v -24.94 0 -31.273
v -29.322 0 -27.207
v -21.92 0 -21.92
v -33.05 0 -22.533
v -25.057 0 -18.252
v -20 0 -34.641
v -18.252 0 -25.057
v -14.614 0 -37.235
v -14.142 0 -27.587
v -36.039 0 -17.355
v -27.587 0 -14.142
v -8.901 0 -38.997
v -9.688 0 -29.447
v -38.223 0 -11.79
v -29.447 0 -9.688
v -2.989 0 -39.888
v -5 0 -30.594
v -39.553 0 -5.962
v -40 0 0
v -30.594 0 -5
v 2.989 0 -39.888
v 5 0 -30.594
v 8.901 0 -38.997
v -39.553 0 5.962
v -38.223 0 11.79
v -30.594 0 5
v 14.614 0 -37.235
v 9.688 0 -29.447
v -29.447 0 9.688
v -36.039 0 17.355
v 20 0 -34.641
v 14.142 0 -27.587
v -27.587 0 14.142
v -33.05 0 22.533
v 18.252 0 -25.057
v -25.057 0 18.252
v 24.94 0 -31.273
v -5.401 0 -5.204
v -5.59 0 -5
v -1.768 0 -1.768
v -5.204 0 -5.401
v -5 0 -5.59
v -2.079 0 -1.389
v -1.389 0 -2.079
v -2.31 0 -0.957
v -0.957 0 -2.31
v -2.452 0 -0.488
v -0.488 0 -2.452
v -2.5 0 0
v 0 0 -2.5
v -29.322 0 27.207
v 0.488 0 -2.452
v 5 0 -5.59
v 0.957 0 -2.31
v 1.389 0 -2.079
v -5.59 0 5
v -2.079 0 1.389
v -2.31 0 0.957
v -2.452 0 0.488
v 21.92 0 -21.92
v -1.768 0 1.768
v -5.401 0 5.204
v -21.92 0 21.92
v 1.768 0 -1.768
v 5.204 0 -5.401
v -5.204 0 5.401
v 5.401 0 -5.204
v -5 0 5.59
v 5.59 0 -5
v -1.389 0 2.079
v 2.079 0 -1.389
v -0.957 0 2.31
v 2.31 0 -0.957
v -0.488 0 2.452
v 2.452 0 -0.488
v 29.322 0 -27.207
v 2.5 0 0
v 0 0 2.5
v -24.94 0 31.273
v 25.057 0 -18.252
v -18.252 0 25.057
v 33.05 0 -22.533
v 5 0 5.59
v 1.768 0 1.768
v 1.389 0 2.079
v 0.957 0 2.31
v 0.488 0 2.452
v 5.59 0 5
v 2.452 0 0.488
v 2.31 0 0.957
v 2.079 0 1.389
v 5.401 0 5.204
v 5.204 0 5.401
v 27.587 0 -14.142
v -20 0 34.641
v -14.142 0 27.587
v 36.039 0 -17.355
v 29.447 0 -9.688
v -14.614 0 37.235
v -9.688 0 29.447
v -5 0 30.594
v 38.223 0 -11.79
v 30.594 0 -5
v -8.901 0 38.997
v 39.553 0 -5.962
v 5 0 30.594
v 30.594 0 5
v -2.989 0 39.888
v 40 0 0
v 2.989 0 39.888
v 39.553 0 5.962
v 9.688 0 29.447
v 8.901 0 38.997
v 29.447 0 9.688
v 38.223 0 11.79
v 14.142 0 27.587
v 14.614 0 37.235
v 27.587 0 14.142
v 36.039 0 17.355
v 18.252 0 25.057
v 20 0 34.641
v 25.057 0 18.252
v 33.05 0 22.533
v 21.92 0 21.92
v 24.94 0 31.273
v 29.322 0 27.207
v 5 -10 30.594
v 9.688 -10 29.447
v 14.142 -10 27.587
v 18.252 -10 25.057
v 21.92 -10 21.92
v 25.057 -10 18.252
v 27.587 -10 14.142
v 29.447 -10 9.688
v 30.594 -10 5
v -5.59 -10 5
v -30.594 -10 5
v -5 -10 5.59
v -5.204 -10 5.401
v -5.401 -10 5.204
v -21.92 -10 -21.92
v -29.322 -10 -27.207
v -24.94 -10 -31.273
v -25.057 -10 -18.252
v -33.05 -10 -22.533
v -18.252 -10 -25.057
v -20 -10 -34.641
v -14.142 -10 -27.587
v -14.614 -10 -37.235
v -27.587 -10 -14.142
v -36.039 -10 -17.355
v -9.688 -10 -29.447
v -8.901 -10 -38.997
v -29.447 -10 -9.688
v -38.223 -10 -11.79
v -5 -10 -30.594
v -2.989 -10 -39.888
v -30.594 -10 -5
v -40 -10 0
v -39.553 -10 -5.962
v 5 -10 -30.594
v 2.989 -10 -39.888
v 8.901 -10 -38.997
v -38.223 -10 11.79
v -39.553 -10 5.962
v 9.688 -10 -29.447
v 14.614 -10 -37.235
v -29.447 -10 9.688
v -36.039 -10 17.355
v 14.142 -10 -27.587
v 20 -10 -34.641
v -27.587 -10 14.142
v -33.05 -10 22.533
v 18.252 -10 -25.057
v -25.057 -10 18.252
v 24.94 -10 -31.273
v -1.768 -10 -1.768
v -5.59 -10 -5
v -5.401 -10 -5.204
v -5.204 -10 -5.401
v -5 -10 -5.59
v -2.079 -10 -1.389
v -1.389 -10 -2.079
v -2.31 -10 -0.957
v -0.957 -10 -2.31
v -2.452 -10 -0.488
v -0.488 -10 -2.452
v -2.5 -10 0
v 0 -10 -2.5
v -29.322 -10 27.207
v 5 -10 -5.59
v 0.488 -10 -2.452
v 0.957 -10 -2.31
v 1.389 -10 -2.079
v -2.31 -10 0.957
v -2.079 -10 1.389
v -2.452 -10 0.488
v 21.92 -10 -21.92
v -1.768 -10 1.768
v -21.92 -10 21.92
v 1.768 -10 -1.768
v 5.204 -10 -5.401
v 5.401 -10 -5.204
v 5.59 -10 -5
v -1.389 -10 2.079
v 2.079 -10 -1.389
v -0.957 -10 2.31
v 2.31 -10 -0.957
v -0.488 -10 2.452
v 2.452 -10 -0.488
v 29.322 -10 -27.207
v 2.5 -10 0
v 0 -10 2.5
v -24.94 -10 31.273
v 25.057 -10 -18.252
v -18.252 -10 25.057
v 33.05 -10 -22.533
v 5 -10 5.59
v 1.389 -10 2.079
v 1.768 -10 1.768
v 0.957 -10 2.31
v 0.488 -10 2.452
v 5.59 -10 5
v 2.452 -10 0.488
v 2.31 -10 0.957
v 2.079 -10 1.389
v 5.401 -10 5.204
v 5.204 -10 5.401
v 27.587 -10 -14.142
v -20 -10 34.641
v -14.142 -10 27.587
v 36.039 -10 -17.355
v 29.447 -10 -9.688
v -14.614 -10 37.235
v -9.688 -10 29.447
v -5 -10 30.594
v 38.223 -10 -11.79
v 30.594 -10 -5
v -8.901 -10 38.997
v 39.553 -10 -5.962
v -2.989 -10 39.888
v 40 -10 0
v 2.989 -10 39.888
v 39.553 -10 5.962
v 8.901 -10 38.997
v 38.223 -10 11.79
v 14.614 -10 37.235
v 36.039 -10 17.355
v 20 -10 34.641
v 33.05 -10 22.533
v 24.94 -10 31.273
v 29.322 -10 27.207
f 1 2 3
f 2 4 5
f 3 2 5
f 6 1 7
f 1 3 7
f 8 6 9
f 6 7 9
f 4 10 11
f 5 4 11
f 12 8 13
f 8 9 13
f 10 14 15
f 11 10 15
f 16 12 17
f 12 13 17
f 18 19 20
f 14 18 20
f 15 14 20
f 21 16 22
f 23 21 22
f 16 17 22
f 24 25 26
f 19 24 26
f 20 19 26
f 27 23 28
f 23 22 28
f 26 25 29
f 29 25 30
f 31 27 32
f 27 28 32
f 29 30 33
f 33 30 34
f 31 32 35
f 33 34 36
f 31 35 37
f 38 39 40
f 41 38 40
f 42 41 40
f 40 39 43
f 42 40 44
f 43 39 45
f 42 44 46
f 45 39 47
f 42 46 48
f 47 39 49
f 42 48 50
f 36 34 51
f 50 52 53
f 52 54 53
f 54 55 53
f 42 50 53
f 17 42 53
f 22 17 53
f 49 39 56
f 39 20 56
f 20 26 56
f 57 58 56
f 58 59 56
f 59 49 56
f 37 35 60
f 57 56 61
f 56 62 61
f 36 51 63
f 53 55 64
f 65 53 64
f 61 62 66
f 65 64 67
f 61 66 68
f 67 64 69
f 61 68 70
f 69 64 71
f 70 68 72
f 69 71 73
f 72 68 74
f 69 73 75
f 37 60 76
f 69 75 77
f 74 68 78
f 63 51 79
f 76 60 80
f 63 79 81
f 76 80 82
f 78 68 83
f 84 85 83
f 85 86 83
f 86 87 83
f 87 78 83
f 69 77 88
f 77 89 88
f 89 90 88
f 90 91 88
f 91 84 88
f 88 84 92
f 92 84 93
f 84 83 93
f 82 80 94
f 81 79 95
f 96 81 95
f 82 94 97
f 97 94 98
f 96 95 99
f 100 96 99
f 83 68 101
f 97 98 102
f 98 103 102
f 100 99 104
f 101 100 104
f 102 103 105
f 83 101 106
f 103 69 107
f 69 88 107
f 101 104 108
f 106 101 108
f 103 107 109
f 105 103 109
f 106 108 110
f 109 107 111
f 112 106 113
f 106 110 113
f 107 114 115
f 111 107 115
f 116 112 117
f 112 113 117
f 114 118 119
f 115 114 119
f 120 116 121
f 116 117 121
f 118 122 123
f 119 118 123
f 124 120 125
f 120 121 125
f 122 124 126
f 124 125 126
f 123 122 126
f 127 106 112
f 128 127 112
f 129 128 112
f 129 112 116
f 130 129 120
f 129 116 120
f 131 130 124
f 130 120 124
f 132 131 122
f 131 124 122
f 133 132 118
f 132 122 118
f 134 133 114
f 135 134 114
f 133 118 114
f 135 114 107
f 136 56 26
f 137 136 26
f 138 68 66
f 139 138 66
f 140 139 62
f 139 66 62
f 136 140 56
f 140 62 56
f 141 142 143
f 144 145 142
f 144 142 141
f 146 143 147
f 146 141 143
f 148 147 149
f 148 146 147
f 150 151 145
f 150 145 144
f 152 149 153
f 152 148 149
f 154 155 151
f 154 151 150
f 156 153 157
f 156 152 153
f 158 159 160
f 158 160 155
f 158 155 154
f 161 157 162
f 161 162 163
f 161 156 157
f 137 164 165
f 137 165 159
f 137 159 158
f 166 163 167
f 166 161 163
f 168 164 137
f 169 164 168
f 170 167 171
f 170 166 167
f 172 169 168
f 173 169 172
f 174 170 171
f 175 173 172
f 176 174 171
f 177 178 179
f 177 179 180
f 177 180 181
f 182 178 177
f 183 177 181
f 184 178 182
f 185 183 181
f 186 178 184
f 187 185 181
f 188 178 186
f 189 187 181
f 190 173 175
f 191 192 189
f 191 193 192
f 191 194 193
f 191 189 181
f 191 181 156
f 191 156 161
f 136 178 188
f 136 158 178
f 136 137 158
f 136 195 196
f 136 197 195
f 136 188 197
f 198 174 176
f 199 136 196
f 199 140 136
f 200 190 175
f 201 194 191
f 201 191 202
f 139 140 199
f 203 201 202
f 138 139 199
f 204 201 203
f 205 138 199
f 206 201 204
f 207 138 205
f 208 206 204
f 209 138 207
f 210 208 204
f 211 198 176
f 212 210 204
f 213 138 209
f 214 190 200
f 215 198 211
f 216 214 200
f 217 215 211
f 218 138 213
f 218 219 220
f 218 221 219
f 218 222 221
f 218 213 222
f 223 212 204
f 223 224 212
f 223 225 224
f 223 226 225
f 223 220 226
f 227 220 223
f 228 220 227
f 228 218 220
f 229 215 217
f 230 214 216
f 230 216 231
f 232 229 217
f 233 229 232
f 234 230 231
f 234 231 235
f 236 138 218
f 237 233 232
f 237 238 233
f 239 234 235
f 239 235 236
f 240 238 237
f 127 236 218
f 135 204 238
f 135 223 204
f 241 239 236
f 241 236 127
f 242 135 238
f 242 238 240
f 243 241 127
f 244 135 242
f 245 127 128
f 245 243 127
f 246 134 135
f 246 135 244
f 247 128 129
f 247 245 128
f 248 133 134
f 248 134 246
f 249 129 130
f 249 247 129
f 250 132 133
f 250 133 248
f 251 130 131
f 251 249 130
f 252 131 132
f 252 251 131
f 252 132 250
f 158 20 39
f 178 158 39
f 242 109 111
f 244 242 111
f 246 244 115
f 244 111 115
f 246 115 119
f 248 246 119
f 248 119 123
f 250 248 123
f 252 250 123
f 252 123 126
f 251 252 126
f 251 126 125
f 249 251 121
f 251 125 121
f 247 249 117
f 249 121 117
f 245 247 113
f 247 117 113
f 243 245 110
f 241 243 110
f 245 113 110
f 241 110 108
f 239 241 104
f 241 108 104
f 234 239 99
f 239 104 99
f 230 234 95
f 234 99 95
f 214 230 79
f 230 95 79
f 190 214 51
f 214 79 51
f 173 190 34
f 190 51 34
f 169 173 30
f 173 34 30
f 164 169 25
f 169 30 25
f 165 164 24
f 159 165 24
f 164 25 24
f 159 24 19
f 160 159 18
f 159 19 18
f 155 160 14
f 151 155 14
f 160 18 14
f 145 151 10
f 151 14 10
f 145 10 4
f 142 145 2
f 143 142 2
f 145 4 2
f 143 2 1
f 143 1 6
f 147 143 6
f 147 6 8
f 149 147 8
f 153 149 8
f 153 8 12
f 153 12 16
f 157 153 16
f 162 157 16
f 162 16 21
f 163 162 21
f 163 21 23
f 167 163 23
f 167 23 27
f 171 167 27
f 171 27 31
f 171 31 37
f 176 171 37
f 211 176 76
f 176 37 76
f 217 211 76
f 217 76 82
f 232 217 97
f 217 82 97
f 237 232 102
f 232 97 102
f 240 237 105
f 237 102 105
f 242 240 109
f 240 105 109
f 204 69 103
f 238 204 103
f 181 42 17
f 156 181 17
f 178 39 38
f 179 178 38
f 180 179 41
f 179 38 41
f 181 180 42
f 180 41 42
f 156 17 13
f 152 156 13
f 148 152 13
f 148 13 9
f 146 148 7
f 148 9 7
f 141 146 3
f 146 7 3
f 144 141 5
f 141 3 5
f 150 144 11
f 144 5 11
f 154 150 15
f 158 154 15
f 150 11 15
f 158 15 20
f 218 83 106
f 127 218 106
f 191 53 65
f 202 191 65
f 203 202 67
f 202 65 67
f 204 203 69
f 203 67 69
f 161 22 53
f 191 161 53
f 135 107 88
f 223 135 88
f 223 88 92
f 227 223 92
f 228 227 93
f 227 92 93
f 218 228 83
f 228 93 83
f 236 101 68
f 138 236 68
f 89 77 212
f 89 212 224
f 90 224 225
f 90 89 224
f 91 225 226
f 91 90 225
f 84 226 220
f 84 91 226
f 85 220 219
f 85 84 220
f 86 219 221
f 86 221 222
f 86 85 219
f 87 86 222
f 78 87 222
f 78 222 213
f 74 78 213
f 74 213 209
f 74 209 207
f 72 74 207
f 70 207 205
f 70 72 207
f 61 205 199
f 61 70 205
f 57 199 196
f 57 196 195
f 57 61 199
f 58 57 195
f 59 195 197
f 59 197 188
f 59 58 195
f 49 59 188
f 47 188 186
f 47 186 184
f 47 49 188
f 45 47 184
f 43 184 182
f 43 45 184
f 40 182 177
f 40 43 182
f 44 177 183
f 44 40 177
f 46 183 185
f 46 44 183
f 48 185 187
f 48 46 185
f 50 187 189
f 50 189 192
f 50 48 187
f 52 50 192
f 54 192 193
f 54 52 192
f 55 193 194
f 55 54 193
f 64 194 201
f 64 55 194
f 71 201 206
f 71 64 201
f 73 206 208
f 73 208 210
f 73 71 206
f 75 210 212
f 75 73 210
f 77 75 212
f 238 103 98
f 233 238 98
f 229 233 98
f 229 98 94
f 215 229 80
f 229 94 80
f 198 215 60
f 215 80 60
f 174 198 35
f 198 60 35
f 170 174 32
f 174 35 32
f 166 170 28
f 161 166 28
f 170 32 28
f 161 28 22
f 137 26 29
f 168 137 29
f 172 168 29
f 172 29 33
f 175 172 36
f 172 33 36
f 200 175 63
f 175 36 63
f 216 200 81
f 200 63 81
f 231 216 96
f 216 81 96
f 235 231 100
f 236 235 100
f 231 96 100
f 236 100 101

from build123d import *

# Parameters (mm, degrees)
F0_R     = 40
F0_R_2   = 2.5
F1_DEPTH = 10


with BuildPart() as f1:
    # F0 (on Front) → F1 (new body)
    with BuildSketch(Plane.XZ):
        Circle(F0_R)
        with BuildLine():
            Line((-30.5941170816, -5), (-5.5901699437, -5))
            ThreePointArc((-5.5901699437, -5), (-5.3033008589, -5.3033008589), (-5, -5.5901699437))
            Line((-5, -5.5901699437), (-5, -30.5941170816))
            ThreePointArc((-5, -30.5941170816), (-21.9203102168, -21.9203102168), (-30.5941170816, -5))
        make_face(mode=Mode.SUBTRACT)
        with BuildLine():
            ThreePointArc((5, -5.5901699437), (5.3033008589, -5.3033008589), (5.5901699437, -5))
            Line((5.5901699437, -5), (30.5941170816, -5))
            ThreePointArc((30.5941170816, -5), (21.9203102168, -21.9203102168), (5, -30.5941170816))
            Line((5, -30.5941170816), (5, -5.5901699437))
        make_face(mode=Mode.SUBTRACT)
        with BuildLine():
            ThreePointArc((-30.5941170816, 5), (-21.9203102168, 21.9203102168), (-5, 30.5941170816))
            Line((-5, 30.5941170816), (-5, 5.5901699437))
            ThreePointArc((-5, 5.5901699437), (-5.3033008589, 5.3033008589), (-5.5901699437, 5))
            Line((-5.5901699437, 5), (-30.5941170816, 5))
        make_face(mode=Mode.SUBTRACT)
        Circle(F0_R_2, mode=Mode.SUBTRACT)
        with BuildLine():
            Line((30.5941170816, 5), (5.5901699437, 5))
            ThreePointArc((5.5901699437, 5), (5.3033008589, 5.3033008589), (5, 5.5901699437))
            Line((5, 5.5901699437), (5, 30.5941170816))
            ThreePointArc((5, 30.5941170816), (21.9203102168, 21.9203102168), (30.5941170816, 5))
        make_face(mode=Mode.SUBTRACT)
    extrude(amount=F1_DEPTH)


solid = f1.part
